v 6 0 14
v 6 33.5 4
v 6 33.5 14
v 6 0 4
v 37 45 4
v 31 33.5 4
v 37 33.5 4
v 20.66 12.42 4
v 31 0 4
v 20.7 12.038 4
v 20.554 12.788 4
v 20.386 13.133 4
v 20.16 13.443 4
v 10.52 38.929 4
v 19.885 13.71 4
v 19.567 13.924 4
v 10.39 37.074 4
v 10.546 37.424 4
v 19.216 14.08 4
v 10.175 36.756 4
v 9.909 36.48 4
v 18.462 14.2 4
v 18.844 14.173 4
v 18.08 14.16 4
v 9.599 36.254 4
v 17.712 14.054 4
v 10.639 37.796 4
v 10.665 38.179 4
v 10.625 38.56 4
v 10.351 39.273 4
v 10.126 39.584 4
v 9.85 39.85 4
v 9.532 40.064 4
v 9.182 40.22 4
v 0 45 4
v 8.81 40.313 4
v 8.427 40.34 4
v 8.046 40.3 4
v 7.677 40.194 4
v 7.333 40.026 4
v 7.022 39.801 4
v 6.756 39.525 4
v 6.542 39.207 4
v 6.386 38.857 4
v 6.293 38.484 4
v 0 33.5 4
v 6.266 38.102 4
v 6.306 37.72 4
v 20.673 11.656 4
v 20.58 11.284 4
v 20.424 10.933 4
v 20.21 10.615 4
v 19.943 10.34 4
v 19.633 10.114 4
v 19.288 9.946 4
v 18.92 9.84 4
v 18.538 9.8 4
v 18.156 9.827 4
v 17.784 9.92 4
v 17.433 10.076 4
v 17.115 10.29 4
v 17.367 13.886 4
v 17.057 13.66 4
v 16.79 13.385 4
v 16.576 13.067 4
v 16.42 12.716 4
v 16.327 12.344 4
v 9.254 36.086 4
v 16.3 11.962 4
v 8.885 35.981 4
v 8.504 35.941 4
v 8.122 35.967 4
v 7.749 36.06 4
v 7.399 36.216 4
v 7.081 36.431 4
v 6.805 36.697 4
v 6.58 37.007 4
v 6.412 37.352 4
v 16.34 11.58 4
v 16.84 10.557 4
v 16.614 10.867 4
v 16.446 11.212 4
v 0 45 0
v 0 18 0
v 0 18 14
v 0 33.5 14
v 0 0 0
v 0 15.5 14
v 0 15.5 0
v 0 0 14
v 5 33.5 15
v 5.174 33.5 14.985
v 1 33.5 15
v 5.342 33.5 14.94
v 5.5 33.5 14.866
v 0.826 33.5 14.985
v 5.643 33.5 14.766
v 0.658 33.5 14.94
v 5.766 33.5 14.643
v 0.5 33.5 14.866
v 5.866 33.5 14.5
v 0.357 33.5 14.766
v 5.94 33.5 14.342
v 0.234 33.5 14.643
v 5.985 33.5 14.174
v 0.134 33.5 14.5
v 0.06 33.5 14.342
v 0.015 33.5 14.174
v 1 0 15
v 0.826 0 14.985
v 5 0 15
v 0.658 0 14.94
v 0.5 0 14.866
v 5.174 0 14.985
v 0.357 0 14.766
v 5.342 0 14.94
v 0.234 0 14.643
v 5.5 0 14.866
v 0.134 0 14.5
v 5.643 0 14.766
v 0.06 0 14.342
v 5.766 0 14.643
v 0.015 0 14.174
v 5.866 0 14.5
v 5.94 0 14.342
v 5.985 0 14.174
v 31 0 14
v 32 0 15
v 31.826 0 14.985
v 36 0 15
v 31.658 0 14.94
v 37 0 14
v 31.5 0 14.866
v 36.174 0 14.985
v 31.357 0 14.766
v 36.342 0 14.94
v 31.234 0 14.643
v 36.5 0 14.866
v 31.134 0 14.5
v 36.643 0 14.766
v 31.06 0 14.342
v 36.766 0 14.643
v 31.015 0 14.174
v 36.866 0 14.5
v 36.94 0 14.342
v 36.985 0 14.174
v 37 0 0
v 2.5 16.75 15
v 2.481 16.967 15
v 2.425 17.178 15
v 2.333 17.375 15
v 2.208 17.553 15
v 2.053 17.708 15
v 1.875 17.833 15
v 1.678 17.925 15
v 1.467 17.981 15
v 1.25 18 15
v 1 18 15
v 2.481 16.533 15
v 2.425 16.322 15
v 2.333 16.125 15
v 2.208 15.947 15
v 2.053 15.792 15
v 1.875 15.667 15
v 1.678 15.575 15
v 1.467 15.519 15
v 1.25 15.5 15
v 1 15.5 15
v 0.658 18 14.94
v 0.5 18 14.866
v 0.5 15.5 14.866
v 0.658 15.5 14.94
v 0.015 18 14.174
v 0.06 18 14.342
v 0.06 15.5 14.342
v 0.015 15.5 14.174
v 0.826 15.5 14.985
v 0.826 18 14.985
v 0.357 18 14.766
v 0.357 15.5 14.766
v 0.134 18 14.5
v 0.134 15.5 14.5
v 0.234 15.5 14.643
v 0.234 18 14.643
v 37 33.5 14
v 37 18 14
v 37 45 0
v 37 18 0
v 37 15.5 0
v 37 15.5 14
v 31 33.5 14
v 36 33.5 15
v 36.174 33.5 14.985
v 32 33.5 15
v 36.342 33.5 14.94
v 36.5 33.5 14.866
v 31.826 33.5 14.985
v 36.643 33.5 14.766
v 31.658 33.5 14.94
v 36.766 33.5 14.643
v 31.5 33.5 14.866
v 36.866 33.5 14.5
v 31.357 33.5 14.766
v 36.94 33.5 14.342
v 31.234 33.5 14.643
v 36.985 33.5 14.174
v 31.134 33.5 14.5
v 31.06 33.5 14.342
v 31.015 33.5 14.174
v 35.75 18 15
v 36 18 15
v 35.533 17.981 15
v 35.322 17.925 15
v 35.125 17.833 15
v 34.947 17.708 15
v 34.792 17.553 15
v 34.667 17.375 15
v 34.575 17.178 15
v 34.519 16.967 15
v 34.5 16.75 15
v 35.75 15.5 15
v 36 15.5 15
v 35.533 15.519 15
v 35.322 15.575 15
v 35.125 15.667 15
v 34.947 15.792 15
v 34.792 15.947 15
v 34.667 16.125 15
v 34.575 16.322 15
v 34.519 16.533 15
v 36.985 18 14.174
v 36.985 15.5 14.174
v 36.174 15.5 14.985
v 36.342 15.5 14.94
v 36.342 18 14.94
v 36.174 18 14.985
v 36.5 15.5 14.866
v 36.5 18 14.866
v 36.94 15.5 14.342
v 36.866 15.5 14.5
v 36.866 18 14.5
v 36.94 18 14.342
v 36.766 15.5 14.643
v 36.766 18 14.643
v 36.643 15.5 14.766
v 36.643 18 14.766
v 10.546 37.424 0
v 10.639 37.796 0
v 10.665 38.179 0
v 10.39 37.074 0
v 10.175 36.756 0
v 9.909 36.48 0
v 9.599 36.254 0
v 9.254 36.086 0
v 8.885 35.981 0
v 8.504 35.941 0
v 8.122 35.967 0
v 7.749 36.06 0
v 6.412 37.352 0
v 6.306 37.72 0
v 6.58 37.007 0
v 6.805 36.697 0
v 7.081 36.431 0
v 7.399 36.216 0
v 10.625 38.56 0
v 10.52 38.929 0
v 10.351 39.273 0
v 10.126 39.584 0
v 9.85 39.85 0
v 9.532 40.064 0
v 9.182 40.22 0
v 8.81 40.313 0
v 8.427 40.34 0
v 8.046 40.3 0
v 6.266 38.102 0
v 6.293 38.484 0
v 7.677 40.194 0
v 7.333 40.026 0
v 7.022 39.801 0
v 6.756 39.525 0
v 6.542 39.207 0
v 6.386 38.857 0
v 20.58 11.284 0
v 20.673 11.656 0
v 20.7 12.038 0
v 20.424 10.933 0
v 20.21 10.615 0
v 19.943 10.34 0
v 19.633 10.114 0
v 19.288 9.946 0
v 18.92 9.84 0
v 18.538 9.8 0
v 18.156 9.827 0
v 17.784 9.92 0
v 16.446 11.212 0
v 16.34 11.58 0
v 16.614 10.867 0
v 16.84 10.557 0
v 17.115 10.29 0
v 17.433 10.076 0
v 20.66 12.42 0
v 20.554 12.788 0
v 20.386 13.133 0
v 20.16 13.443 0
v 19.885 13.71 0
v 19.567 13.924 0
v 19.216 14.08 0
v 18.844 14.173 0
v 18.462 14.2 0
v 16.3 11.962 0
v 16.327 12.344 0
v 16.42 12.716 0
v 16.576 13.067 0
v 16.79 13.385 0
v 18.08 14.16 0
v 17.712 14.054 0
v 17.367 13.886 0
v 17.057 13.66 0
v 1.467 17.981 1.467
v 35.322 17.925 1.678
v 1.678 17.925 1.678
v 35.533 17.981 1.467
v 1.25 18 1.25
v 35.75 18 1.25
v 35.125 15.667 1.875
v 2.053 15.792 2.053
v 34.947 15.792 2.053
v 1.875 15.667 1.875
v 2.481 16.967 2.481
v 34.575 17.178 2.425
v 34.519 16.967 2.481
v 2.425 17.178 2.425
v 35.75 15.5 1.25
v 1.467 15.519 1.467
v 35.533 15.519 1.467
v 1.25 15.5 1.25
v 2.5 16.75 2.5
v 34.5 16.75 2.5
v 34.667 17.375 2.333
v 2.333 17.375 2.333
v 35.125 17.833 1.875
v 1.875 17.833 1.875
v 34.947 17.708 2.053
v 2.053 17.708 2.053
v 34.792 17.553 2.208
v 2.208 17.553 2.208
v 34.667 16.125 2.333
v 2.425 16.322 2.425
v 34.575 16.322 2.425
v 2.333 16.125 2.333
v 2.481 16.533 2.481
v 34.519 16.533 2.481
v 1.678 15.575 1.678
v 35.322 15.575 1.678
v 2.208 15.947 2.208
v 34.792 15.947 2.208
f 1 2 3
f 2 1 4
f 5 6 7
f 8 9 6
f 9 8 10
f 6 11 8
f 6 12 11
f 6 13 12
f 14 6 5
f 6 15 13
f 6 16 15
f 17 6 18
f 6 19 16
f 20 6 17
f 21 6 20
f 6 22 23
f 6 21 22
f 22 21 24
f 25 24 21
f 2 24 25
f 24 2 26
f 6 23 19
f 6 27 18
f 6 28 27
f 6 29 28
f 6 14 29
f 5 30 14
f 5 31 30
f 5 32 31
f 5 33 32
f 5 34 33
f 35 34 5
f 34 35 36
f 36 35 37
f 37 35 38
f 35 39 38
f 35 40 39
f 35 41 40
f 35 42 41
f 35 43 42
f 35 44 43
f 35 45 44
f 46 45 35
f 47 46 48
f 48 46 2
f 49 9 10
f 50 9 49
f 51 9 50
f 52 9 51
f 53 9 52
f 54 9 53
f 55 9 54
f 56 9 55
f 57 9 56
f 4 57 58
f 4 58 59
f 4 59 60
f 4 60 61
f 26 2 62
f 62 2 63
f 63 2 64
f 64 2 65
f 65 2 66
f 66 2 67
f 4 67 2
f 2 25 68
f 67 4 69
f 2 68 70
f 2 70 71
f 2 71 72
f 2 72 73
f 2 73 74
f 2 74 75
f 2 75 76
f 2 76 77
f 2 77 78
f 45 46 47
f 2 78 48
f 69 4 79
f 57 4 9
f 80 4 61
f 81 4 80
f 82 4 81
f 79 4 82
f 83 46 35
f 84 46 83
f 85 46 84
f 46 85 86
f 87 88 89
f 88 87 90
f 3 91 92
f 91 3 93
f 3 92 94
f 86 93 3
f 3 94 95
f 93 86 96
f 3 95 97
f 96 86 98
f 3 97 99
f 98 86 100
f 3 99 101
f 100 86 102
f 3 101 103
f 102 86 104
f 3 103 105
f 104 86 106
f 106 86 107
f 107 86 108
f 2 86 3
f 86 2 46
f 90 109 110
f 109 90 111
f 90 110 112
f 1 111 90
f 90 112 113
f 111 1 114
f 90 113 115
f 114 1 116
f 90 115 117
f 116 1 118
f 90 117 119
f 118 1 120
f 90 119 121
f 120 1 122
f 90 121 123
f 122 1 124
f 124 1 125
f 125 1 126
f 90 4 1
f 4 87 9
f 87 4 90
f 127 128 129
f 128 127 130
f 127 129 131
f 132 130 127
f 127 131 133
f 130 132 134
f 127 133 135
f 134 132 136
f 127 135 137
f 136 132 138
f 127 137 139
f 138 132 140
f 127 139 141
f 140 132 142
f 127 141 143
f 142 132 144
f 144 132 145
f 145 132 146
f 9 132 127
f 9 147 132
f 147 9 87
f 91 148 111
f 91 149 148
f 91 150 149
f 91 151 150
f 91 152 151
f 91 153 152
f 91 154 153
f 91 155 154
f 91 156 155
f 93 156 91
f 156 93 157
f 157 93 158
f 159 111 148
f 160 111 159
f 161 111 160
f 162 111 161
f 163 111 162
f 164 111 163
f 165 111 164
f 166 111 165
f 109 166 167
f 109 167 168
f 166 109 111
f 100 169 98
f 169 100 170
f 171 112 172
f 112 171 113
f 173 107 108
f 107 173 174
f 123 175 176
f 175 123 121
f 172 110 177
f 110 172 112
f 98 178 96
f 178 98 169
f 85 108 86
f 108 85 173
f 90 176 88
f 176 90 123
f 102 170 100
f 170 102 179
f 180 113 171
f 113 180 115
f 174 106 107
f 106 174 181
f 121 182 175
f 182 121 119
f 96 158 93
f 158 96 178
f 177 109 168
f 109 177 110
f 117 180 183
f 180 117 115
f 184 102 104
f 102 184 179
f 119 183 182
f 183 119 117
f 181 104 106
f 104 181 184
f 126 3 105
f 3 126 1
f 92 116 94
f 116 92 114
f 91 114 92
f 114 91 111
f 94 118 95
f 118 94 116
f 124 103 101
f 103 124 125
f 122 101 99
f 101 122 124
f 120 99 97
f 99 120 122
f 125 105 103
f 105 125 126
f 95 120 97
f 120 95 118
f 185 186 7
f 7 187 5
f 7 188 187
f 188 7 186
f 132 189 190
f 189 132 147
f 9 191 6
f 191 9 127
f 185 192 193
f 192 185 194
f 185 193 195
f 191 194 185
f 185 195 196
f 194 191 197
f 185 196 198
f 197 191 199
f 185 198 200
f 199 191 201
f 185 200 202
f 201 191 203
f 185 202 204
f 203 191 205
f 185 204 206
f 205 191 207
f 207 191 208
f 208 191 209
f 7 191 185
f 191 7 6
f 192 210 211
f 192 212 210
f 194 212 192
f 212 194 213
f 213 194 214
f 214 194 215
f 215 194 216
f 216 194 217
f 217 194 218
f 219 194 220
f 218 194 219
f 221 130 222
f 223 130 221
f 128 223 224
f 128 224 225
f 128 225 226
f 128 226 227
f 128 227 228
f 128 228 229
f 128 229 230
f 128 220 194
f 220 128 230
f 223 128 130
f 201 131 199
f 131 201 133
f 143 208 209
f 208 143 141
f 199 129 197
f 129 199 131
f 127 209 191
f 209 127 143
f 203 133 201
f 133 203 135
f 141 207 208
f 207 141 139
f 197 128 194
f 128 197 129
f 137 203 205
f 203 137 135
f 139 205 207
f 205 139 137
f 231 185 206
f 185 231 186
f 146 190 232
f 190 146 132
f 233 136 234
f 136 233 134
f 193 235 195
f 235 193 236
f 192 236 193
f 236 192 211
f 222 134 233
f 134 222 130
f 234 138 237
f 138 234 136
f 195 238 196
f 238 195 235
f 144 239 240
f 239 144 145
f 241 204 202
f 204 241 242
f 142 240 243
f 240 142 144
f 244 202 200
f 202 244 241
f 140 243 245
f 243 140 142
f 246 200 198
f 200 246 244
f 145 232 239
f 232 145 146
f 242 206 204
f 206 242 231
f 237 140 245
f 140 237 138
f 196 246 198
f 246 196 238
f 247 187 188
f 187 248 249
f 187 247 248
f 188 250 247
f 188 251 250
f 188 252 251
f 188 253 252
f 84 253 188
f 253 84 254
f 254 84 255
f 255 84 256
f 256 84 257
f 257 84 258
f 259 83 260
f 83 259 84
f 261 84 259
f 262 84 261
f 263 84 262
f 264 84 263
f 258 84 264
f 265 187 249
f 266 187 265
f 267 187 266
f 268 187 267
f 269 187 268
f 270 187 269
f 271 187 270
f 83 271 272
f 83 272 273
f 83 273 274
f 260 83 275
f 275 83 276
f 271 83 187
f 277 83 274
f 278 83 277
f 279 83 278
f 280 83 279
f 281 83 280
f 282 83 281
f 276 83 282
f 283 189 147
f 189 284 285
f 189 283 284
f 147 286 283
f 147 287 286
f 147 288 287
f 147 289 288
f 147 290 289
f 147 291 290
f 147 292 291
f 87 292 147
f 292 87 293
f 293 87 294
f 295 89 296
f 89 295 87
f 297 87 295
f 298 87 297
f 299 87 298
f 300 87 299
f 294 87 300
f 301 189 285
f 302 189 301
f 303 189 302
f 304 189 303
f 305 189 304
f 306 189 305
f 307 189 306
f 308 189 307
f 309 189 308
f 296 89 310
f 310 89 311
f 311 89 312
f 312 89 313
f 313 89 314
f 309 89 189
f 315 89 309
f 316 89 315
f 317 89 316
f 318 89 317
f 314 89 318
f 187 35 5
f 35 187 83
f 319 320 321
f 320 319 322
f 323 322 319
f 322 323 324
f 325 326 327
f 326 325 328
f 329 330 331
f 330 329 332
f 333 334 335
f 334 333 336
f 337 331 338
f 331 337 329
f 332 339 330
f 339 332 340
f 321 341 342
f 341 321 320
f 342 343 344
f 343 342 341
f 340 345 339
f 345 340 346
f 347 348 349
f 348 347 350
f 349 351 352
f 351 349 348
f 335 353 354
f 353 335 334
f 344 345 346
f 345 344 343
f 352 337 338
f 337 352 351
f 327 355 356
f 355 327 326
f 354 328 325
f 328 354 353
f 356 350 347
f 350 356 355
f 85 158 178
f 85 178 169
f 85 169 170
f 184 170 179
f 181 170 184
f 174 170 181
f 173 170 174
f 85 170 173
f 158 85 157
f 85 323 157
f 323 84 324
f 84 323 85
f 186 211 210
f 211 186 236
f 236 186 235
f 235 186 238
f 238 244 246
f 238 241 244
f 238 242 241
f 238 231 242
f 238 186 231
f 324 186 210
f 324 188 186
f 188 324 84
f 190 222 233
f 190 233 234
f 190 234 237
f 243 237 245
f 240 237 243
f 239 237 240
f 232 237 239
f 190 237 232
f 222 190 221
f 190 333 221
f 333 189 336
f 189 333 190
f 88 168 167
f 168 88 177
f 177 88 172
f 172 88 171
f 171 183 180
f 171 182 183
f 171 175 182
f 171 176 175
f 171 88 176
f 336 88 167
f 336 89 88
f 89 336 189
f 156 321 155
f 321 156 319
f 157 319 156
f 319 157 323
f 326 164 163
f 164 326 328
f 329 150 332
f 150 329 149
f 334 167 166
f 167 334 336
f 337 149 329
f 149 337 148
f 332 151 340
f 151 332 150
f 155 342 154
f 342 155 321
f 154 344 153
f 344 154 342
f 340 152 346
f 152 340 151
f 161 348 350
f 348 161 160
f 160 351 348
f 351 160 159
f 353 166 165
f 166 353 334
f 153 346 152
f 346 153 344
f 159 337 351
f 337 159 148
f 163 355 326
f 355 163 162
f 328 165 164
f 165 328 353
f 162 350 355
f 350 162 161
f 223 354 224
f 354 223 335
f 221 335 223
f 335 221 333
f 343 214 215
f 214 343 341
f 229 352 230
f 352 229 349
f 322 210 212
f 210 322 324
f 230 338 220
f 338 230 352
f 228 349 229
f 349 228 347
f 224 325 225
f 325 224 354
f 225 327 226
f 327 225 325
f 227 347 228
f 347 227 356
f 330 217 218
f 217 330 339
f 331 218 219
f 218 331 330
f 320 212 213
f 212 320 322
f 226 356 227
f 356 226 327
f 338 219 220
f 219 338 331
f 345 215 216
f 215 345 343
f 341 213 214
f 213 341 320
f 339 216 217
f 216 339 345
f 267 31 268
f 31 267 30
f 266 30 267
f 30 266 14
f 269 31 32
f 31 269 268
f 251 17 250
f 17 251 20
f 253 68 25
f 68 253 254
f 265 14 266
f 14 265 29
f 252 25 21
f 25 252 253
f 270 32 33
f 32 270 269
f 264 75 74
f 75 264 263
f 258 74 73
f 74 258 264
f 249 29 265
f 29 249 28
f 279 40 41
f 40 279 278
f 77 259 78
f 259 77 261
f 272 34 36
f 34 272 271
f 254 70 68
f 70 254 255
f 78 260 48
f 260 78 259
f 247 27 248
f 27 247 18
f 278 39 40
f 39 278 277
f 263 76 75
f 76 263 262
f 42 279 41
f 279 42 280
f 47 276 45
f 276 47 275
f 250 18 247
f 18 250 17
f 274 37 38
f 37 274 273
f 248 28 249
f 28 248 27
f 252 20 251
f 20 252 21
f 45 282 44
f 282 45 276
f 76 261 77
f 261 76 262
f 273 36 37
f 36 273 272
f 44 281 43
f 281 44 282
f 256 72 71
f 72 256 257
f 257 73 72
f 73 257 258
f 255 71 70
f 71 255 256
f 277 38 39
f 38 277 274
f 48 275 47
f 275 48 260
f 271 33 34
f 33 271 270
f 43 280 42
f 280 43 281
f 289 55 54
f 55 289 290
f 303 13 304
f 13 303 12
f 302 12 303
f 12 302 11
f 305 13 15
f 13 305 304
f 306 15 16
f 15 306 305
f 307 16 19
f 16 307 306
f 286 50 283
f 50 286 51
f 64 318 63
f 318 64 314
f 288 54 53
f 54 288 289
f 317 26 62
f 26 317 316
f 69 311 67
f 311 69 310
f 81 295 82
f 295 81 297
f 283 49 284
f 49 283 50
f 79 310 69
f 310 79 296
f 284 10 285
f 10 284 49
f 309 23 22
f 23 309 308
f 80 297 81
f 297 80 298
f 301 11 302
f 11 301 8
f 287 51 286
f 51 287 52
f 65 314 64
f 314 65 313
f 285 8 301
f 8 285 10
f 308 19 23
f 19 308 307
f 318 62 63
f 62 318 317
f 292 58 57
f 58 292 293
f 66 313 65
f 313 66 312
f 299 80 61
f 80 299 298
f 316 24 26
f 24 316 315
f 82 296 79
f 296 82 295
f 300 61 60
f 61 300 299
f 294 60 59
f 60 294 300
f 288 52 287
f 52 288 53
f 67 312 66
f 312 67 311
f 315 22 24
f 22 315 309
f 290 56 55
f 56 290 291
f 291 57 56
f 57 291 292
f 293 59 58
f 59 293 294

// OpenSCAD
$fn=36;

module kabelfuehrung(length, dia=2.5)
{
    translate([0, 0, dia/2])
    rotate([90, 0, 0])
    cylinder(d=dia, h=length, center=true);
    translate([-dia/2, -length/2, -1])
    cube([dia, length, dia/2+1]);
}

module seitenwand(breite=5)
{
    union()
    {
        cube([breite, 33.5, 10]);
        translate([1, 0, 0])
        cube([breite-2, 33.5, 11]);

        translate([1, 33.5/2, 10])
        rotate([90, 0, 0])
        cylinder(d=2, h=33.5, center=true);

        translate([breite-1, 33.5/2, 10])
        rotate([90, 0, 0])
        cylinder(d=2, h=33.5, center=true);
    }
}

//kabelfuehrung(length=30);

//seitenwand();

// Grundplatte
h_base = 4;
b_base = 37;
l_base = 45;

module schrauben_ausbuchtung(h, d=4.4)
{   
    translate([0, 0, -1])
    cylinder(d = d, h = h+2);
}
    
difference()
{
    union()
    {
        cube([b_base, l_base, h_base]); 

        translate([0, 0, h_base])
        union()
        {
            seitenwand(breite=6);
            translate([b_base-6, 0, 0])
            seitenwand(breite=6);
        }
    }

    lk1 = b_base+2;
    translate([lk1/2-1, 33.5/2, 0])
    rotate([0, 0, 90])
    kabelfuehrung(length=lk1);
    
    lk2 = h_base + 10 + 4;
    translate([0, 33.5/2, lk2/2-2])
    rotate([90, 0, 90])
    kabelfuehrung(length=lk2);
    
    translate([b_base, 33.5/2, lk2/2-2])
    rotate([90, 0, 270])
    kabelfuehrung(length=lk2);
    
    
    
    translate([b_base/2, 12, 0])
    rotate([0, 0, 21])
    union()
    {
        translate([0, 28, 0])
        schrauben_ausbuchtung(h=h_base);
        schrauben_ausbuchtung(h=h_base);
    }
}
